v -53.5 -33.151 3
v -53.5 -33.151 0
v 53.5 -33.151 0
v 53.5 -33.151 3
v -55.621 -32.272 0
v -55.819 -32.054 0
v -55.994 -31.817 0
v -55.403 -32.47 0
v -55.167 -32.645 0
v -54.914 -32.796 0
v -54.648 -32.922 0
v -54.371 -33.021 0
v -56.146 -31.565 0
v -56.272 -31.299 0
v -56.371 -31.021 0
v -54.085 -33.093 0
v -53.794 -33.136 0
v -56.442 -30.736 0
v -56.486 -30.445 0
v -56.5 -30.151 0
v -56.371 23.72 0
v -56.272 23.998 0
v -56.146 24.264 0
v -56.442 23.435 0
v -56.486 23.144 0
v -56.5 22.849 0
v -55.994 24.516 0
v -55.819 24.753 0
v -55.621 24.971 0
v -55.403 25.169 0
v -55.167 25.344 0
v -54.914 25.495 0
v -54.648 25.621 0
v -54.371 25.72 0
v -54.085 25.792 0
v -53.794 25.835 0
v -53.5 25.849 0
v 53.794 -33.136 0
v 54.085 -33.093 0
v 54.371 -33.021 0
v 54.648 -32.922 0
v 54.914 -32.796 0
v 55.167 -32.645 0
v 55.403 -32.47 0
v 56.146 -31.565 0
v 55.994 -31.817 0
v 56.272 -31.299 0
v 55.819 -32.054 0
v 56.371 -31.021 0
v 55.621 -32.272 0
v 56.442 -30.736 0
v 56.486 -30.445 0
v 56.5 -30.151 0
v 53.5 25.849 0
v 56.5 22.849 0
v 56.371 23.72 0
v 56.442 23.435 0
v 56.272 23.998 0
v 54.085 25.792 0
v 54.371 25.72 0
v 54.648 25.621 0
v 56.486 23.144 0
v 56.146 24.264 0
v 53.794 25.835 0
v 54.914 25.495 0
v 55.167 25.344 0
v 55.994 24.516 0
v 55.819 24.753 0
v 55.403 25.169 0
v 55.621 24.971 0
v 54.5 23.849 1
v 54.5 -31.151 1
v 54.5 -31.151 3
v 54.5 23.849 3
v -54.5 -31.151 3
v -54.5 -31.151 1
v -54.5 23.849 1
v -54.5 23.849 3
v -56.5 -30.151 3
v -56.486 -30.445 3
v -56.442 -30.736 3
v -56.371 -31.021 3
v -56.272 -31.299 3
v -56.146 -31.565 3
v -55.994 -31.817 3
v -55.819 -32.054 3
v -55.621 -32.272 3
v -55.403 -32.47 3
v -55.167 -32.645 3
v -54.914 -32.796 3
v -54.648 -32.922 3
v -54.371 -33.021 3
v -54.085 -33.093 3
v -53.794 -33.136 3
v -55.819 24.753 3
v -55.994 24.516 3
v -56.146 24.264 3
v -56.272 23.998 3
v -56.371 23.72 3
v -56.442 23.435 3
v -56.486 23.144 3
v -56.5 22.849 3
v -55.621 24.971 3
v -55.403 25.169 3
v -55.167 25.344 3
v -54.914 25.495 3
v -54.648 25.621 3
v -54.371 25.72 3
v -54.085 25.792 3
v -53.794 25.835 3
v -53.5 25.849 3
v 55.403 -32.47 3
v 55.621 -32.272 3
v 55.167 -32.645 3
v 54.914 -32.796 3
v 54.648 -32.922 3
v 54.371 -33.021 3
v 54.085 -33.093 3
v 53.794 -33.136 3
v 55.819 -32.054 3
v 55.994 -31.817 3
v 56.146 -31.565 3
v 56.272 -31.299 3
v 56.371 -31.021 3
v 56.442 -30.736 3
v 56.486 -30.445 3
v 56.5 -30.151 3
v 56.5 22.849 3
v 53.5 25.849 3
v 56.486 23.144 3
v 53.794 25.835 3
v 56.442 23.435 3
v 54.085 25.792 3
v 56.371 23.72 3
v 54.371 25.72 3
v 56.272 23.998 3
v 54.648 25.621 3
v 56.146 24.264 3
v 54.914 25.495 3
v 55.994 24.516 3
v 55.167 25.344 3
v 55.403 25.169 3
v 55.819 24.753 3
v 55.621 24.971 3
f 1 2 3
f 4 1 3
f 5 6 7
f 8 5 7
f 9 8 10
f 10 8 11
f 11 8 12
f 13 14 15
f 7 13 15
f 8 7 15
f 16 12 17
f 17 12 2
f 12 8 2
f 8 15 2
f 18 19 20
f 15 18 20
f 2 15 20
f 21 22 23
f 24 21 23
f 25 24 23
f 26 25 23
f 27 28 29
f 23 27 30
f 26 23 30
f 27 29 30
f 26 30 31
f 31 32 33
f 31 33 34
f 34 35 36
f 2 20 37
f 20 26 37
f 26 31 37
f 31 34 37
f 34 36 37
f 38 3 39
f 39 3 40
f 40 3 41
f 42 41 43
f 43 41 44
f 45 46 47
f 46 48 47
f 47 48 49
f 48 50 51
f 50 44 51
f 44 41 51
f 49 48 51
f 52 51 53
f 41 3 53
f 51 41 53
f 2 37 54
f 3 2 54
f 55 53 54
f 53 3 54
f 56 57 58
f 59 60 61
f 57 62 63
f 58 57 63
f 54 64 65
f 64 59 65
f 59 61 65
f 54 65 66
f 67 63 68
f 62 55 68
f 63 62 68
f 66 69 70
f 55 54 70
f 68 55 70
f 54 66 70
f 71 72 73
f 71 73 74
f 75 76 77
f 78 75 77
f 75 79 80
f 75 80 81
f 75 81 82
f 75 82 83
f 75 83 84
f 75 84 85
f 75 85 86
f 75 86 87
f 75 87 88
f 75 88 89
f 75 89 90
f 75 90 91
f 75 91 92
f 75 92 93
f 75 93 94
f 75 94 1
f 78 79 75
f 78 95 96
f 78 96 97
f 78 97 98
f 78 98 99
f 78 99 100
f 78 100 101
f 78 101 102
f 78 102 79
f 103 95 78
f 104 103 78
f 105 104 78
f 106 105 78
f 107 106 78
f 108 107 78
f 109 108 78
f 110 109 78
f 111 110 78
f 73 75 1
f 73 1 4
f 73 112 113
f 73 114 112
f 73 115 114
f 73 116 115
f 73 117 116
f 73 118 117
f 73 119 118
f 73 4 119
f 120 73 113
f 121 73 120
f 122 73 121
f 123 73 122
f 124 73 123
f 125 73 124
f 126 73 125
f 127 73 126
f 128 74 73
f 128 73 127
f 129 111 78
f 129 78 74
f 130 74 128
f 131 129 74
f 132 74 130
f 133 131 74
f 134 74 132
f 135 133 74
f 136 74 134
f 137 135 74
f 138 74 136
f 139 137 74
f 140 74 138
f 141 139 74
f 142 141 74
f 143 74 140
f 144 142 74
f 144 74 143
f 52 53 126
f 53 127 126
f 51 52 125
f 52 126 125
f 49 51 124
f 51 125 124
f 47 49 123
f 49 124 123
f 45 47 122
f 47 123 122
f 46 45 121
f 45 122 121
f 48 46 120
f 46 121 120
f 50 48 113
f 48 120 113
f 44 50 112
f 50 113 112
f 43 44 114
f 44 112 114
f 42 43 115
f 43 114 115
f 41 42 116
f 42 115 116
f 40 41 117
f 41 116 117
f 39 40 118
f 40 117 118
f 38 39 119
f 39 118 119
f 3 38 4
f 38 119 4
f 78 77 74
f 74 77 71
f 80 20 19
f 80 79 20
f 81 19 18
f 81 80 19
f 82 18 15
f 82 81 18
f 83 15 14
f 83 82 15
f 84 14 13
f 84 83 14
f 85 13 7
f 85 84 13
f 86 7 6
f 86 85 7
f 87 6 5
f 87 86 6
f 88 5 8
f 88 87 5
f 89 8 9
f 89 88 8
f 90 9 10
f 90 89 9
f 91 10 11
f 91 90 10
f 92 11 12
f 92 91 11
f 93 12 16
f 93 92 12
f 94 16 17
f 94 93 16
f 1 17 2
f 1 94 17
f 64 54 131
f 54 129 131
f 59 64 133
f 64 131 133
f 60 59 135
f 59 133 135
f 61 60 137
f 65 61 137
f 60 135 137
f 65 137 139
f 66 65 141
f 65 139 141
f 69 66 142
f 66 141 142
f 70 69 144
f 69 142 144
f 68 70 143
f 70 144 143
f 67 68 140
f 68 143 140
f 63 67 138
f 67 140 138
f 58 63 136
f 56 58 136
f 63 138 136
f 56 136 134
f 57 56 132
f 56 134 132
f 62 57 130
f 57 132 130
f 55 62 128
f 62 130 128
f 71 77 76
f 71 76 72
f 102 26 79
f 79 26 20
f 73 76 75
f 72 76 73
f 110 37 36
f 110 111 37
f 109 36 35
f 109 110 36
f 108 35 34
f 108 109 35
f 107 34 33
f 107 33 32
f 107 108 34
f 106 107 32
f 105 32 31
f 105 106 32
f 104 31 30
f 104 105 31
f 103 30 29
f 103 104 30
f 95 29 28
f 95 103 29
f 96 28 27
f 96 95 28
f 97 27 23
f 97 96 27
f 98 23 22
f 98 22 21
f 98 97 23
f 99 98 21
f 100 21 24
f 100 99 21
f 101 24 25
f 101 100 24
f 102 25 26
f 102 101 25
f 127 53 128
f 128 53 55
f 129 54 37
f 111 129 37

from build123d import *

# Parameters (mm, degrees)
F0_W     = 109
F0_H     = 55
F1_DEPTH = 1
F2_DEPTH = 3
F3_R     = 3


with BuildPart() as f1:
    # F0 (on Top) → F1 (new body)
    with BuildSketch(Plane.XY):
        with Locations((0, -3.65053)):
            Rectangle(F0_W, F0_H)
    extrude(amount=F1_DEPTH)

    # F0 (on Top) → F2 (join)
    with BuildSketch(Plane.XY):
        Polygon((56.5, 25.84947), (-56.5, 25.84947), (-56.5, -33.15053), (-11, -33.15053), (-10, -33.15053), (10, -33.15053), (11, -33.15053), (56.5, -33.15053), align=None)
        with Locations((0, -3.65053)):
            Rectangle(F0_W, F0_H, mode=Mode.SUBTRACT)
    extrude(amount=F2_DEPTH)

    # F3
    f3_edges = [f1.edges().sort_by_distance(p)[0] for p in [
        (-56.5, 25.84947, 1.5),
        (-56.5, -33.15053, 1.5),
        (56.5, -33.15053, 1.5),
        (56.5, 25.84947, 1.5),
    ]]
    fillet(f3_edges, radius=F3_R)


solid = f1.part
